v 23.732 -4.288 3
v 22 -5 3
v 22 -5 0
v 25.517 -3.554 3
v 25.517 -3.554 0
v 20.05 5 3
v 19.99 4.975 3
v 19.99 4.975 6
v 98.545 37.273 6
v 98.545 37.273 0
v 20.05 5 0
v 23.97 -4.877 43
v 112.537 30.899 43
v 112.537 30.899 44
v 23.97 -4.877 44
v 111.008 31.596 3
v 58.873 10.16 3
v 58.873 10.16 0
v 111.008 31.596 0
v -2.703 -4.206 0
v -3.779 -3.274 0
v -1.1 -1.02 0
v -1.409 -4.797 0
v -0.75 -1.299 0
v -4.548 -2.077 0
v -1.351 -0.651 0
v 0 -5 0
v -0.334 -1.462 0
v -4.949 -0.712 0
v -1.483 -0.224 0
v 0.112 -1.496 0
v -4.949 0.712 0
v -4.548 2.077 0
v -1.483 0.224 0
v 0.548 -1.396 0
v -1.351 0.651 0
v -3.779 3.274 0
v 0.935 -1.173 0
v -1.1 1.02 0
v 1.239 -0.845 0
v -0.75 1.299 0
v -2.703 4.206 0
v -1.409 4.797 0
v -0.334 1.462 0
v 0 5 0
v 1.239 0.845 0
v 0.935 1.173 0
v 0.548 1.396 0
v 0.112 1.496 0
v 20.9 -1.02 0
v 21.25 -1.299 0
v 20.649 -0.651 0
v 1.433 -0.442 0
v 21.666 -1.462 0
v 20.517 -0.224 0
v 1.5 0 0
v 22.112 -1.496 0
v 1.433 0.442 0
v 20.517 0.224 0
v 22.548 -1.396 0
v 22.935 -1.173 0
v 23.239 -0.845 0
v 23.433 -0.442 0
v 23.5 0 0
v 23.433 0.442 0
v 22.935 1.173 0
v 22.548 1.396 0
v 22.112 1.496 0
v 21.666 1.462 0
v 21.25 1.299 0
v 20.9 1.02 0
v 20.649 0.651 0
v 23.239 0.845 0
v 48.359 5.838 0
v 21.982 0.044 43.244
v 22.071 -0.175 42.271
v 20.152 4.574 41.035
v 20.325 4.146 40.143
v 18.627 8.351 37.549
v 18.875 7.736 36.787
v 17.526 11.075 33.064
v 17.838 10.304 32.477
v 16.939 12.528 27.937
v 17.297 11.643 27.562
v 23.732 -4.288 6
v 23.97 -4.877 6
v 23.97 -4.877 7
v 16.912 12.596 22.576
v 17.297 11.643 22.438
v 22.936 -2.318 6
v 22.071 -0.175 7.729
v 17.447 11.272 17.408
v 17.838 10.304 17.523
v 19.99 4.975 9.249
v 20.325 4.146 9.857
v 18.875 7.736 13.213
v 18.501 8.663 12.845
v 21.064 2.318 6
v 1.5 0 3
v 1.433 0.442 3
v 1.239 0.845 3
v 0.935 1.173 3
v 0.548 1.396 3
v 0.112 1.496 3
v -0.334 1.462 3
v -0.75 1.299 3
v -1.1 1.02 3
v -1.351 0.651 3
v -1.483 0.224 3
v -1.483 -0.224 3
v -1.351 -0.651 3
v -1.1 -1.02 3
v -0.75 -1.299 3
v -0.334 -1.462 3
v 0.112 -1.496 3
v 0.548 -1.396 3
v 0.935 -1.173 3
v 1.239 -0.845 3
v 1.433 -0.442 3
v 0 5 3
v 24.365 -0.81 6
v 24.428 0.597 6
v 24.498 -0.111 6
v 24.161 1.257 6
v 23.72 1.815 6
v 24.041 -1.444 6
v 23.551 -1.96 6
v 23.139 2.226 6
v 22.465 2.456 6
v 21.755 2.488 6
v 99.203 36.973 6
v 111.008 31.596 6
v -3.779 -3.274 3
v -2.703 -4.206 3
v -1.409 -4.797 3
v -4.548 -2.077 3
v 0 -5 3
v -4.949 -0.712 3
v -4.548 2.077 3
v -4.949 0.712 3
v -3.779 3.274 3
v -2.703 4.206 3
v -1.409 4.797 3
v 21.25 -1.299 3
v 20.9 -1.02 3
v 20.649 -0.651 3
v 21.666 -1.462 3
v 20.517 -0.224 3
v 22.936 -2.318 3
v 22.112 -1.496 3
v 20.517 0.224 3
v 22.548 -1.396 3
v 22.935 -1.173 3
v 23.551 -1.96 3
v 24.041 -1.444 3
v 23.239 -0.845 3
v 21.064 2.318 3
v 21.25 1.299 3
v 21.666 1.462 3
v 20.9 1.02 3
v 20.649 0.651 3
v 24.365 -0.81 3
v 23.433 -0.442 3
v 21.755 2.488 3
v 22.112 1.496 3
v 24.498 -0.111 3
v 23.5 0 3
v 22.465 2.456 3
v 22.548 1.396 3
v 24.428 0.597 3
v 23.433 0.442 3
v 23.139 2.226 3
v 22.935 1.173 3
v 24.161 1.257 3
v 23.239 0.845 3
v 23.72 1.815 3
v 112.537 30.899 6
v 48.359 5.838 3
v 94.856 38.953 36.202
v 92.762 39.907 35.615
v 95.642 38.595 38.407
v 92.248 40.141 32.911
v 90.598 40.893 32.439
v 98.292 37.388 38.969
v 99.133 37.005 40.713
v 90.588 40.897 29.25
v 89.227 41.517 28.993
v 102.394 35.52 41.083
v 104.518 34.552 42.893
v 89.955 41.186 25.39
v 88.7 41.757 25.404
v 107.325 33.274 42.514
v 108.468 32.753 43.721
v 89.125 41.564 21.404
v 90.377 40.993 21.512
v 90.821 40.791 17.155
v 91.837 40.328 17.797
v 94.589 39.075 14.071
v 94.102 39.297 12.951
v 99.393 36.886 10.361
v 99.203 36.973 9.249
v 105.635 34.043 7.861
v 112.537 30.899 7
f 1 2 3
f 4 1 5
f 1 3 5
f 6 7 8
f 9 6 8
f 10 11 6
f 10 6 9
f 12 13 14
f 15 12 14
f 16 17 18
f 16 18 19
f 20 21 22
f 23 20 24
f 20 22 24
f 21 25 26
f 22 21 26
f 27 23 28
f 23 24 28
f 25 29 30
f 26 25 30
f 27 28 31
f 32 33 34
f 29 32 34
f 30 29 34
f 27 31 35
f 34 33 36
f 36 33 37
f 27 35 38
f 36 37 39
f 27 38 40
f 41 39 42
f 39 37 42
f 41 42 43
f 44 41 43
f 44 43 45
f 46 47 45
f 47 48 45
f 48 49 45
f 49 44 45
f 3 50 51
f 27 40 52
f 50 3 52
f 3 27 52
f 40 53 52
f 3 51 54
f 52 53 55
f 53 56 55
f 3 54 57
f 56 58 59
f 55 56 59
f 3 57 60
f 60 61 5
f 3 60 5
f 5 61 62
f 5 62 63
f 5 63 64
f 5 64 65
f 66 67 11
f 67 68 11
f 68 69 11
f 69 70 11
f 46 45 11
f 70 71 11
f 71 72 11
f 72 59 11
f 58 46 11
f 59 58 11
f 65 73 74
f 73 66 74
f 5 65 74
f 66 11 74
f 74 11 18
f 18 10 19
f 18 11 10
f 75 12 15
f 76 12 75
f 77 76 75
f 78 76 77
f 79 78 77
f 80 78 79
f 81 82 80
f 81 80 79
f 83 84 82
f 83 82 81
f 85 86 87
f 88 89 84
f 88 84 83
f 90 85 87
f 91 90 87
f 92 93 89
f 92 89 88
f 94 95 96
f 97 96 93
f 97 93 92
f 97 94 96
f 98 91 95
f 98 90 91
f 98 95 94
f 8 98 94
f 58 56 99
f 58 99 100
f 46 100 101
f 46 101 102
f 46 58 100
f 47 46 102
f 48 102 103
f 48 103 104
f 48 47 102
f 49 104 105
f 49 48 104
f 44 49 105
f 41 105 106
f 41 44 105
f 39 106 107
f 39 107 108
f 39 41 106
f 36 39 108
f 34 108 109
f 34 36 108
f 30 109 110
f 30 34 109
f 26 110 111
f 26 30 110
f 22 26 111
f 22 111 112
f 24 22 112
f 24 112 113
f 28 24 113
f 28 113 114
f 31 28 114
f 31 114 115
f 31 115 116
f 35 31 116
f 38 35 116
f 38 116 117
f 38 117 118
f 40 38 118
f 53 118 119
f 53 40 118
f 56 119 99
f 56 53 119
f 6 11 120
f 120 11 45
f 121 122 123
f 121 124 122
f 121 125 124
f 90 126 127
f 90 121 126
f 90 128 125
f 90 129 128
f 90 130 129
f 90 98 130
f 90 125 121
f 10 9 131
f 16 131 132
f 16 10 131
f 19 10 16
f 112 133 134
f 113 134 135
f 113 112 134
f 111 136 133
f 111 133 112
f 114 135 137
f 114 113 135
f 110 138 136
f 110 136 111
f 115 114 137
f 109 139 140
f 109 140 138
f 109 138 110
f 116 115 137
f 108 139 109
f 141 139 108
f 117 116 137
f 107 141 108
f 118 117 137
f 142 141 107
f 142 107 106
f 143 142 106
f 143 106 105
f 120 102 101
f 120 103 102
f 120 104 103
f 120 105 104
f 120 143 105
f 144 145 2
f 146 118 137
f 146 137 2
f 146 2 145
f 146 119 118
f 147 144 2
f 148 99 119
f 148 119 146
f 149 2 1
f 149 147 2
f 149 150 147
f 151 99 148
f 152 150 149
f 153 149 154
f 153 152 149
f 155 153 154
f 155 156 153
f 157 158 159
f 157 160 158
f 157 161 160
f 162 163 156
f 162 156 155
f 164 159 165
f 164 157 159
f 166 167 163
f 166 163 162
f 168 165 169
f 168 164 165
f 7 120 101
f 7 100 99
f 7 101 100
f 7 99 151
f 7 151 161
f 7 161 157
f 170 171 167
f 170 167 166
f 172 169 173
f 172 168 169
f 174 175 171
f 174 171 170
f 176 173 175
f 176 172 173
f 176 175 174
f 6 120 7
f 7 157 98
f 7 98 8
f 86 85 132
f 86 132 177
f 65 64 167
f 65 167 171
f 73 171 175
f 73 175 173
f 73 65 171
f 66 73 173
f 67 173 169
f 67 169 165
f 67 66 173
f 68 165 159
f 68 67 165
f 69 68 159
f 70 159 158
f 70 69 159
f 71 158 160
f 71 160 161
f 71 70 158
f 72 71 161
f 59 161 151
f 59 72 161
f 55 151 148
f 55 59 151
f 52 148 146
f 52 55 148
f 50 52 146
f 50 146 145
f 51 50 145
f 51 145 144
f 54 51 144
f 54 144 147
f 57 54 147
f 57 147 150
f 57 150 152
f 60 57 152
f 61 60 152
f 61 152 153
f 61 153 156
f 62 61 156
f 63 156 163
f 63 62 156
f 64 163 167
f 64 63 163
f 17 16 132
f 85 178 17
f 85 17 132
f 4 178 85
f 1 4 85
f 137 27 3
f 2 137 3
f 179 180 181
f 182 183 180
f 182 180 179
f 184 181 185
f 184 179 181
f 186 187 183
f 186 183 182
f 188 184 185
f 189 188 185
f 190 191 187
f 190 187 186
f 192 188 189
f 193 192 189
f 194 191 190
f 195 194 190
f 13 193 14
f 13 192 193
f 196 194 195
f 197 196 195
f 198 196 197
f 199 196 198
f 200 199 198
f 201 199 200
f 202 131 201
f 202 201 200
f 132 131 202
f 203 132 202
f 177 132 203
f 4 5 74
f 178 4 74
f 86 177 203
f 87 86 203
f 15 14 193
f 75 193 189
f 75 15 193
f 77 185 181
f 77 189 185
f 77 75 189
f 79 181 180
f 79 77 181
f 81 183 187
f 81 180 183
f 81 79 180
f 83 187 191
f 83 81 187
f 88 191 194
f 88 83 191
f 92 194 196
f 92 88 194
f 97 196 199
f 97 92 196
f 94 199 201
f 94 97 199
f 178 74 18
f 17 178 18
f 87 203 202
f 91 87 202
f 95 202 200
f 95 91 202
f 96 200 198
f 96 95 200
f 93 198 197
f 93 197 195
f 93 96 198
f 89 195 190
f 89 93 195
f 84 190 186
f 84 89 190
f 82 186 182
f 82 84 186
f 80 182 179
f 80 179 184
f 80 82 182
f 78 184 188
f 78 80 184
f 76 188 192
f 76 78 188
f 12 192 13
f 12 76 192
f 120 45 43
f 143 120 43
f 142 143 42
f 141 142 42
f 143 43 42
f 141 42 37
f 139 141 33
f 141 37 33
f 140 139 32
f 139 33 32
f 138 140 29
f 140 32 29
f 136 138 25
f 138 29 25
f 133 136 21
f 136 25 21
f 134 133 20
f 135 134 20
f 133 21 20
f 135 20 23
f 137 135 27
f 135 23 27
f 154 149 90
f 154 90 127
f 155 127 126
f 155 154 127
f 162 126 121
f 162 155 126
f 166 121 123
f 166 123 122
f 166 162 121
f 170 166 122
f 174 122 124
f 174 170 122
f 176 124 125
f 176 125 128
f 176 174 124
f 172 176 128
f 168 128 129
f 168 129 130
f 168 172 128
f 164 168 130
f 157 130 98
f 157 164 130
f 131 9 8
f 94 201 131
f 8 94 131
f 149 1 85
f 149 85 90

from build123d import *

# Parameters (mm, degrees)
SKETCH1_R           = 1.5
BOSS_EXTRUDE1_DEPTH = 3
EXTRUDE_1_DEPTH     = 3
EXTRUDE_3_DEPTH     = 3
EXTRUDE_4_REACH     = 98.931


with BuildPart() as part:
    # Sketch1 → Boss-Extrude1 (new body)
    # profile 1 of 2: a face of its own
    with BuildSketch(Plane.XY):
        with BuildLine():
            Line((20.05, 5), (0, 5))
            ThreePointArc((0, 5), (-5, 0), (0, -5))
            Line((0, -5), (22, -5))
            Line((22, -5), (25.516973514, -3.553997369))
            ThreePointArc((25.516973514, -3.553997369), (26.624391141, 1.901317064), (22, 5))
            Line((22, 5), (20.05, 5))
        make_face()
        Circle(SKETCH1_R, mode=Mode.SUBTRACT)
        with Locations((22, 0)):
            Circle(SKETCH1_R, mode=Mode.SUBTRACT)
    # profile 2 of 2: a face of its own
    with BuildSketch(Plane.XY):
        with BuildLine():
            Line((46.409029503, 15.837507263), (20.05, 5))
            Line((20.05, 5), (22, 5))
            ThreePointArc((22, 5), (26.624391141, 1.901317064), (25.516973514, -3.553997369))
            Line((25.516973514, -3.553997369), (48.359029503, 5.837507263))
            Line((48.359029503, 5.837507263), (58.872830999, 10.16025367))
            Line((58.872830999, 10.16025367), (53.359871826, 12.67140304))
            Line((53.359871826, 12.67140304), (46.409029503, 15.837507263))
        make_face()
    extrude(amount=BOSS_EXTRUDE1_DEPTH)

    # 草图1 → 凸台-拉伸1 (add)
    with BuildSketch(Plane.XY.offset(3)):
        Polygon((46.409029503, 15.837507263), (58.872830999, 10.16025367), (111.008388469, 31.59577286), (98.544586973, 37.273026453), align=None)
    extrude(amount=-EXTRUDE_1_DEPTH)

    # 草图17 → 凸台-拉伸3 (add)
    with BuildSketch(Plane.XY.offset(3)):
        with BuildLine():
            Line((111.008388469, 31.59577286), (23.732077121, -4.287856999))
            Line((23.732077121, -4.287856999), (22.936363323, -2.318021512))
            ThreePointArc((22.936363323, -2.318021512), (24.318021512, 0.936363323), (21.063636677, 2.318021512))
            Line((21.063636677, 2.318021512), (19.990187108, 4.975407947))
            Line((19.990187108, 4.975407947), (98.544586973, 37.273026453))
            Line((98.544586973, 37.273026453), (111.008388469, 31.59577286))
        make_face()
    extrude(amount=EXTRUDE_3_DEPTH)

    # 凸台-拉伸4: up to this plane
    extrude_4_end = Plane(origin=(98.544586973, 37.273026453, -70.058401543), z_dir=(0.4145222599320868, 0.9100391727946636, 0))
    # 草图18 → 凸台-拉伸4 (add, up to the surface)
    with BuildSketch(Plane(origin=(18.913747522, 7.640196343, 0), x_dir=(0.3745453290899799, -0.9272086046067943, 0), z_dir=(0.9272086046067944, 0.37454532908997995, 0)), mode=Mode.PRIVATE) as extrude_4_sk1:
        with BuildLine():
            Line((13.499999459, -6), (13.499999459, -7))
            ThreePointArc((13.499999459, -7), (-4.500000541, -25), (13.499999459, -43))
            Line((13.499999459, -43), (13.499999459, -44))
            ThreePointArc((13.499999459, -44), (-4.669553865, -30.55583765), (2.873990149, -9.249192842))
            Line((2.873990149, -9.249192842), (2.873990149, -6))
            Line((2.873990149, -6), (13.499999459, -6))
        make_face()
    extrude_4_tool1 = split(extrude(extrude_4_sk1.sketch, amount=EXTRUDE_4_REACH, mode=Mode.PRIVATE), bisect_by=extrude_4_end, keep=Keep.BOTH, mode=Mode.PRIVATE)
    add(extrude_4_tool1.solids().sort_by_distance((20.149314, 4.581481, 7.624596))[0])


solid = part.part
